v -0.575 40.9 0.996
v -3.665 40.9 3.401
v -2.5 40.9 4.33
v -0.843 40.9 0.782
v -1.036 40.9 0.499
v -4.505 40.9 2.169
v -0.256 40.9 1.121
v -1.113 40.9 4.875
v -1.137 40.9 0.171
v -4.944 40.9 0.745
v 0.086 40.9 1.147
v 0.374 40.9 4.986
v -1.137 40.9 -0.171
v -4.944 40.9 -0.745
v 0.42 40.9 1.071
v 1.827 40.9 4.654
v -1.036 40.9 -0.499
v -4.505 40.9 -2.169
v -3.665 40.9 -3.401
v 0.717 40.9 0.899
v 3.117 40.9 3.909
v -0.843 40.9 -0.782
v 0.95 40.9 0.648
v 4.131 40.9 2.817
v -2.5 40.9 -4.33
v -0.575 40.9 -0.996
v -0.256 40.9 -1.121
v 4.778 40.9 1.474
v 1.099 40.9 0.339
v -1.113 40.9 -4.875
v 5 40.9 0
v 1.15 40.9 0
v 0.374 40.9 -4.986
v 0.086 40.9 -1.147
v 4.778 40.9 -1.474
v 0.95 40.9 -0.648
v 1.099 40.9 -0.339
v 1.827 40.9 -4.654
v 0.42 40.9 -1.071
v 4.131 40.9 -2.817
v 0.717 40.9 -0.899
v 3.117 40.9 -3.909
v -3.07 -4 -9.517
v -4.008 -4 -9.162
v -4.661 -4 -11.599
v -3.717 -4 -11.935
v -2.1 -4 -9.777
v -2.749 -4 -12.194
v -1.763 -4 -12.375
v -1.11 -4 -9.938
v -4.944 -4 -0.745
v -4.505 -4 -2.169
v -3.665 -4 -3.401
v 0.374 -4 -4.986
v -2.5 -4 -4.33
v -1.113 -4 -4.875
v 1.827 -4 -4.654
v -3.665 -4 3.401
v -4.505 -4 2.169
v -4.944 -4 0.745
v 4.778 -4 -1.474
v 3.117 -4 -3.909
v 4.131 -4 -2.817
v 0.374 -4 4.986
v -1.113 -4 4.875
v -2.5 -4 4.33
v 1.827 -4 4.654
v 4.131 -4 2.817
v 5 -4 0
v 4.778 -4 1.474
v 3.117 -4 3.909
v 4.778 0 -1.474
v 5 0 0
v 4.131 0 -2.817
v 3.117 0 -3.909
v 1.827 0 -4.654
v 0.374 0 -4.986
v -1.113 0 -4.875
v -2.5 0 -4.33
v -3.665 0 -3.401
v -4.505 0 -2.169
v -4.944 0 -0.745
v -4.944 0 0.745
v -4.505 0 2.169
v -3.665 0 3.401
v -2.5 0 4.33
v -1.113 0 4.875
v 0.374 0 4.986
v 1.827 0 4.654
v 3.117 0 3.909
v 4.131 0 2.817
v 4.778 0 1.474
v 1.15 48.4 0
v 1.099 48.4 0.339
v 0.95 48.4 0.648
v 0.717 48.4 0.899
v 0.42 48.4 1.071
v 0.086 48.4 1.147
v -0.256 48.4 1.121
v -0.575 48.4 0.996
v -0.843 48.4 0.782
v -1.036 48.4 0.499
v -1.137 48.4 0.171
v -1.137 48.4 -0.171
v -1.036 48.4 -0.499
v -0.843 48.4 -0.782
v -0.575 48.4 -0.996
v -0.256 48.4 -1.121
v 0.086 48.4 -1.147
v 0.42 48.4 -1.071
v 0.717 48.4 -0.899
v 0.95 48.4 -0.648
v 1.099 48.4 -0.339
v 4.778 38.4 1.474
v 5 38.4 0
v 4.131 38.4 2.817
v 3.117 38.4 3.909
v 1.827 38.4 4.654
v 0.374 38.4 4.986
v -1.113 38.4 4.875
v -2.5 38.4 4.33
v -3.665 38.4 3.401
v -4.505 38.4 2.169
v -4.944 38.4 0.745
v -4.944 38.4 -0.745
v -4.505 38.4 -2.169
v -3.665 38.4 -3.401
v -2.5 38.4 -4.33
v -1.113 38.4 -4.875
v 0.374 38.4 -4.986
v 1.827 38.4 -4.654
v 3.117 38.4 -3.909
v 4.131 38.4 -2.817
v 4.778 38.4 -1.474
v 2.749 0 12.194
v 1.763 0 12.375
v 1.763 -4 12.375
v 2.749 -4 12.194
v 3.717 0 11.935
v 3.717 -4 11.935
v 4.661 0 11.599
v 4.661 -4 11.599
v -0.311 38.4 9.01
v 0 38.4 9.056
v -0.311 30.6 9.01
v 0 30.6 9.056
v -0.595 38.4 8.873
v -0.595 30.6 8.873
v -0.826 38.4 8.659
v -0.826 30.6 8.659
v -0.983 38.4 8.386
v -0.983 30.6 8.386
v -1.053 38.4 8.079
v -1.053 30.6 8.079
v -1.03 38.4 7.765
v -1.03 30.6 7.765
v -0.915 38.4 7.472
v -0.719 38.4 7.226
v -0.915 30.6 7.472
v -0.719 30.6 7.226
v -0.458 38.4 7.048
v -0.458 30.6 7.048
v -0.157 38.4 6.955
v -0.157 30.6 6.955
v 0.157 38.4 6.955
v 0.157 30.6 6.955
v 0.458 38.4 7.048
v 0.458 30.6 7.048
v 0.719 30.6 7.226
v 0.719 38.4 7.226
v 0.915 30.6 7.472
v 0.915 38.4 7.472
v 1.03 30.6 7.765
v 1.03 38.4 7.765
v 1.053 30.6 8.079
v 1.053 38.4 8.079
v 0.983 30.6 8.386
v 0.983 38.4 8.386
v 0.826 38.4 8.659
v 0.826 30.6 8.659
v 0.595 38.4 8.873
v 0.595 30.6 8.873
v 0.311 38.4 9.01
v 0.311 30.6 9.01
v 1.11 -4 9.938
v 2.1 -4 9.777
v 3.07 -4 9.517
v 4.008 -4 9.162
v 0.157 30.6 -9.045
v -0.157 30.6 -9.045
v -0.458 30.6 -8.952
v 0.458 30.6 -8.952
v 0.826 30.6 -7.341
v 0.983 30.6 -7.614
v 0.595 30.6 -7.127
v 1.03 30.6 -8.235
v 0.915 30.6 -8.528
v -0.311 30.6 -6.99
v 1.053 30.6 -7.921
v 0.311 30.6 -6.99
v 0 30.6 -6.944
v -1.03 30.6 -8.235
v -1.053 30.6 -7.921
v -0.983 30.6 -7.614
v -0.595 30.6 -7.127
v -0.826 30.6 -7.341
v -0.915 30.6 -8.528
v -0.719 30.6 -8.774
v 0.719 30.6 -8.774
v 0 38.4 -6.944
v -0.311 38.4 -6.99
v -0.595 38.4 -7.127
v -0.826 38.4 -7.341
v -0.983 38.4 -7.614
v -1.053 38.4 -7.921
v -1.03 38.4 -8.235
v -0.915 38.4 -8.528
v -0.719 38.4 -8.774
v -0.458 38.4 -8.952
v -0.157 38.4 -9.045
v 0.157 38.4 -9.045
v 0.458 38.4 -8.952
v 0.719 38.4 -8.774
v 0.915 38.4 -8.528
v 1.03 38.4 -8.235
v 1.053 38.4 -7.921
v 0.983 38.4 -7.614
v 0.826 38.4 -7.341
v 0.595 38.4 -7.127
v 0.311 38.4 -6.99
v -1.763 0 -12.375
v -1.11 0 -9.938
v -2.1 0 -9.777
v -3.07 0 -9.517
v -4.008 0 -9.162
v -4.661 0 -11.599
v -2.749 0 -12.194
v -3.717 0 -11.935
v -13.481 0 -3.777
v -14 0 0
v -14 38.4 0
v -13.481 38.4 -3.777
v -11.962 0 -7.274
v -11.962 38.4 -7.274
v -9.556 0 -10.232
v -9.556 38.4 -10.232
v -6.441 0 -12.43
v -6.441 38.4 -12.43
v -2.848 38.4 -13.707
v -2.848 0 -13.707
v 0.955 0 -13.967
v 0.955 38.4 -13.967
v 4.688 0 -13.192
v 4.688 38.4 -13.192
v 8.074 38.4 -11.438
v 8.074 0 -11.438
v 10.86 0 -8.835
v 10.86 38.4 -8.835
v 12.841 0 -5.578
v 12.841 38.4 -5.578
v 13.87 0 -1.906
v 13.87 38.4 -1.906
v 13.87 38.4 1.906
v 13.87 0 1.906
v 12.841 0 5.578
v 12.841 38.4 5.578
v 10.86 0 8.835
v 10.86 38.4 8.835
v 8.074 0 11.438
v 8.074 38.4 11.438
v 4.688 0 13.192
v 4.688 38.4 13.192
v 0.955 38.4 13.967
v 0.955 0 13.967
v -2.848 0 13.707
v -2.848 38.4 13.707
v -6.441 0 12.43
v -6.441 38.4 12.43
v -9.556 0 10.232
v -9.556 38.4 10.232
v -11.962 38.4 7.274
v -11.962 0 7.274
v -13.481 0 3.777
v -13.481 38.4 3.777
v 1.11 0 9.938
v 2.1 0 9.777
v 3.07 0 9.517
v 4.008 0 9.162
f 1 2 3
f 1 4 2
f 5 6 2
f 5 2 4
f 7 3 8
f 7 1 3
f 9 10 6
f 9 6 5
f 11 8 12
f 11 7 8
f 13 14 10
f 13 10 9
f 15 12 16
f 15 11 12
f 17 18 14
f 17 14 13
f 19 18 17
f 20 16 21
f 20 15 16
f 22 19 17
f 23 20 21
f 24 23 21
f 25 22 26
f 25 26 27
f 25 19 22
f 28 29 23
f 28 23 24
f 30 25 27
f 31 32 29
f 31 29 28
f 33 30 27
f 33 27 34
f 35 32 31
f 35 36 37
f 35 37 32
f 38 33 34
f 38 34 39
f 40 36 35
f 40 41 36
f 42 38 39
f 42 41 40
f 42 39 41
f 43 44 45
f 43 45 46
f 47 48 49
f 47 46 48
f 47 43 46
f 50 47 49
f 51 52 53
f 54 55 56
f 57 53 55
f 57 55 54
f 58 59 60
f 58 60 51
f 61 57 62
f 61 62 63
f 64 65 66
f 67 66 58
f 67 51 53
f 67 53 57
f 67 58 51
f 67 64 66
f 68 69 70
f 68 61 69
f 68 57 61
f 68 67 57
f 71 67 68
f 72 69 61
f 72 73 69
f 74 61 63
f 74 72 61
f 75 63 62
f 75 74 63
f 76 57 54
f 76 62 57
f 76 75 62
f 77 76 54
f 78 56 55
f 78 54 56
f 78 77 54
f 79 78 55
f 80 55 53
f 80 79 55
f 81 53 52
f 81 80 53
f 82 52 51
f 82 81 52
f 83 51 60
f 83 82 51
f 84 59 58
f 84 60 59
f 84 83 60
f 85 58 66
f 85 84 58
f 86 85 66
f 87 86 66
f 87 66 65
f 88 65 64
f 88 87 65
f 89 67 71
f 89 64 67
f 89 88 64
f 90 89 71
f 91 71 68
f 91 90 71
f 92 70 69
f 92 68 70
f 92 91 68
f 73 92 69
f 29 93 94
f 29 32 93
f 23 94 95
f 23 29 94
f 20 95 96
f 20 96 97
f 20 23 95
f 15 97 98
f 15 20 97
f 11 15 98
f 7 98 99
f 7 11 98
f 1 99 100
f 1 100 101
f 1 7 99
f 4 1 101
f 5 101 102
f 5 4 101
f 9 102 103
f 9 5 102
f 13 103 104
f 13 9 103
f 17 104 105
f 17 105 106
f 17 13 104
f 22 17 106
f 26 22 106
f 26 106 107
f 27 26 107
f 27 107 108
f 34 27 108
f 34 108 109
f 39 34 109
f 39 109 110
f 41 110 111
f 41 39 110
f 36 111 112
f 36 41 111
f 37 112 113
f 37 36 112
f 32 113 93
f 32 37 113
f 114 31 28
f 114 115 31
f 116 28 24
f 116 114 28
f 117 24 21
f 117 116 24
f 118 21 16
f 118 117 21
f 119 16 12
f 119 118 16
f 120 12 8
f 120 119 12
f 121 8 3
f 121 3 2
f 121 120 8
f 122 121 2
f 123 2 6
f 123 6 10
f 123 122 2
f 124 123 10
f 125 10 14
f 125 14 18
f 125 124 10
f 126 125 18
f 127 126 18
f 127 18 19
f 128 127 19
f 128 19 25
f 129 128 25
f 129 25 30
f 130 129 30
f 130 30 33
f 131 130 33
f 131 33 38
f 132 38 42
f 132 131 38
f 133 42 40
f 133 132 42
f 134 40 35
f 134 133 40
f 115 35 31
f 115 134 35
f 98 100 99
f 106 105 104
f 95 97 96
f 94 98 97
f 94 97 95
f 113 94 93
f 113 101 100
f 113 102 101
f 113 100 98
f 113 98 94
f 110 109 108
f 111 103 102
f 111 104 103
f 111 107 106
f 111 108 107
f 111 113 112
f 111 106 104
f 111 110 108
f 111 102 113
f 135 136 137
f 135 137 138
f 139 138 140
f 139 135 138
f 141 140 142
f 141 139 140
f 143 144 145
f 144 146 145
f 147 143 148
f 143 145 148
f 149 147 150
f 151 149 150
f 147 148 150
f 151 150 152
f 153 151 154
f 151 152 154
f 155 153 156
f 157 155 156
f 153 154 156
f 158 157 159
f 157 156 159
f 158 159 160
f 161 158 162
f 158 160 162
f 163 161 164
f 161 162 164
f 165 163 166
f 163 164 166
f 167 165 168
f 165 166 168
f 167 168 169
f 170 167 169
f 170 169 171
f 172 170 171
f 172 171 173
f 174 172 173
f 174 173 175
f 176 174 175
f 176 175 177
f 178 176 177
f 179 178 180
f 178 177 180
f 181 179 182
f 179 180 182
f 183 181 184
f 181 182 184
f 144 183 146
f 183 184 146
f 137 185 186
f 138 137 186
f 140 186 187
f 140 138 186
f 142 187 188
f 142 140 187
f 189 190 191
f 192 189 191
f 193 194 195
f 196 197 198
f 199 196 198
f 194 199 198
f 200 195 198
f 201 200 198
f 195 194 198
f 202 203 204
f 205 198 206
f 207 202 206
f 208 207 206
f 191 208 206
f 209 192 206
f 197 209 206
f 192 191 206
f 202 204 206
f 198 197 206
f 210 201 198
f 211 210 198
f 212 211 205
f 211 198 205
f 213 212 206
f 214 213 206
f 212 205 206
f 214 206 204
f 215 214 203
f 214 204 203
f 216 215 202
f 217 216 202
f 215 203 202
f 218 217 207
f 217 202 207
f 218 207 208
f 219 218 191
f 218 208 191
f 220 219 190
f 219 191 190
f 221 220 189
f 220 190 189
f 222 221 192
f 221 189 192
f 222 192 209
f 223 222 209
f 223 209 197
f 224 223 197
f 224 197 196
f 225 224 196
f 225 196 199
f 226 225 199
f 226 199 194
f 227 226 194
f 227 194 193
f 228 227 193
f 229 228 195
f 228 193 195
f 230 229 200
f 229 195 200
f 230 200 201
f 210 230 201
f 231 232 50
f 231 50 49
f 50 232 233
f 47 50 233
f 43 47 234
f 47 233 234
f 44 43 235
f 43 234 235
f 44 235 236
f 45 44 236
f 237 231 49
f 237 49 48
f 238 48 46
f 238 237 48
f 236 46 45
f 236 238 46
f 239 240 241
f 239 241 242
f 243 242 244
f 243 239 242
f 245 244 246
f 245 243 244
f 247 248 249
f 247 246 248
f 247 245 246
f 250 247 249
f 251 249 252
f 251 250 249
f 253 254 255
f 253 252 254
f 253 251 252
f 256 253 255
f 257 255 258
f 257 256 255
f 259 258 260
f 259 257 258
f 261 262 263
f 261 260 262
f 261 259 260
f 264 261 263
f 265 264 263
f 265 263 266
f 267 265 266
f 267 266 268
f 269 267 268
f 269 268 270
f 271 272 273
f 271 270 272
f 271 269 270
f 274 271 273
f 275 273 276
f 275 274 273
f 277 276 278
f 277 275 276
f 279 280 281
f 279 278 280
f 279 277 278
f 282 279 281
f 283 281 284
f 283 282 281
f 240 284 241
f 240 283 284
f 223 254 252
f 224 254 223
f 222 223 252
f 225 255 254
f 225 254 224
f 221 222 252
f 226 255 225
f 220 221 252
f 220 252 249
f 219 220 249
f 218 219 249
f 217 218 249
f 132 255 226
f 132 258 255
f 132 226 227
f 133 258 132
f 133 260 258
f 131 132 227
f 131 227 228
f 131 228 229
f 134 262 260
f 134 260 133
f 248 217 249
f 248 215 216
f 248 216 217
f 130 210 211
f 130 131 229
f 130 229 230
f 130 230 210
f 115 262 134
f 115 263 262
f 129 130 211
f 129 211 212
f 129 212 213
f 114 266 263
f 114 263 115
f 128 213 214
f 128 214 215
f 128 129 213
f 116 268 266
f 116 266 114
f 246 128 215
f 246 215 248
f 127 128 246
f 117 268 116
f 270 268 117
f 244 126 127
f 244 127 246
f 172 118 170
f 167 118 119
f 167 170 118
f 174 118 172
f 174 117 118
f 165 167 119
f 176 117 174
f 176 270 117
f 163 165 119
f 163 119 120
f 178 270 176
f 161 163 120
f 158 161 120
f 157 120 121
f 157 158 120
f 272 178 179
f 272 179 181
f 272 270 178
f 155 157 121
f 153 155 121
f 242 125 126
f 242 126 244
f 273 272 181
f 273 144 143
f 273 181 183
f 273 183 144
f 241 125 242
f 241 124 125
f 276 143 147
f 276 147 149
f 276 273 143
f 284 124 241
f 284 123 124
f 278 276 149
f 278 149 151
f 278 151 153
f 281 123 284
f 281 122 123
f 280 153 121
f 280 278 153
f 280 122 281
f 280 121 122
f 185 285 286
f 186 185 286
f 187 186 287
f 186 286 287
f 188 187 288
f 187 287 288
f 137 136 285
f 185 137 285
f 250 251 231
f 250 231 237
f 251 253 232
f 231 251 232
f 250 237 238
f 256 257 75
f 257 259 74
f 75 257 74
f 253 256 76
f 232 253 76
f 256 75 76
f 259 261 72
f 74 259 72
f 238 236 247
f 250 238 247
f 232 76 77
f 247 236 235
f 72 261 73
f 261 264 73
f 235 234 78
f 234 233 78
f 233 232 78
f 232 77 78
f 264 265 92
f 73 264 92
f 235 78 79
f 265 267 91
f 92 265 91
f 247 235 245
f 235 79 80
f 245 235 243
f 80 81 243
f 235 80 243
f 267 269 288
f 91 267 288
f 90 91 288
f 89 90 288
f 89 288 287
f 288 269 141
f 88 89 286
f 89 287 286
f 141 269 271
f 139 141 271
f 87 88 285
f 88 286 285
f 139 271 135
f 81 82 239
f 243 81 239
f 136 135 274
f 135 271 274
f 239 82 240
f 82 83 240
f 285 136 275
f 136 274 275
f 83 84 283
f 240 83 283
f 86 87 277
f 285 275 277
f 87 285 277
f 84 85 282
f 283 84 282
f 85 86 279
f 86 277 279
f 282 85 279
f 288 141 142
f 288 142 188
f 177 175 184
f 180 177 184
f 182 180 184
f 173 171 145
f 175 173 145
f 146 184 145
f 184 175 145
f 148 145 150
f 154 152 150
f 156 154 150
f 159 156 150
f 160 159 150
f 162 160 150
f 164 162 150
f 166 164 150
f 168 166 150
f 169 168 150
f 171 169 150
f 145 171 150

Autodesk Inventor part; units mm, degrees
ref_plane "YZ Plane" through (0, 0, 0) normal (1, 0, 0) x (0, 1, 0)
ref_plane "XZ Plane" through (0, 0, 0) normal (0, 1, 0) x (-1, 0, 0)
ref_plane "XY Plane" through (0, 0, 0) normal (0, 0, 1) x (1, 0, 0)
sketch "Sketch1" plane through (0, 0, 0) normal (0, 1, 0) x (-1, 0, 0)
  circle A0 centre (0, 0) radius 14
  dimension "d0" = 28
extrude "Extrusion1" add sketch "Sketch1" along normal blind 38.4
sketch "Sketch2" plane through (0, 38.4, 0) normal (0, 1, 0) x (1, 0, 0)
  circle A0 centre (0, 0) radius 5
  circle A1 centre (0, 0) radius 1.15
  circle A2 centre (0, 0) radius 8
  line L0 (0, -8) -> (0, 8)
  dimension "d3" = 10
  dimension "d6" = 2.3
  dimension "d9" = 16
extrude "Extrusion2" add sketch "Sketch2" along normal blind 2.5 contours A0 L0 A1 | L0 A1 A0 | L0 A1 | A1 L0
extrude "Extrusion3" add sketch "Sketch2" along normal blind 10 contours L0 A1 | A1 L0
hole "Hole1" at (0, 38.4, 8) at (0, 38.4, -8) direction (0, -1, 0) diameter 2.1129 depth 7.8 thread size "M2.6x0.45" class "6H" standard "ISO Metric profile"
sketch "Sketch3" plane through (0, 0, 0) normal (0, -1, 0) x (1, 0, 0)
  circle A0 centre (0, 0) radius 5
  dimension "d17" = 10
extrude "Extrusion4" add sketch "Sketch3" along normal blind 4
sketch "Sketch4" plane through (0, 0, 0) normal (0, -1, 0) x (1, 0, 0)
  line L0 (-12.0122, 7.6623) -> (12.8258, 7.6623) construction
  line L1 (12.8258, 7.6623) -> (12.8258, -7.5309) construction
  line L2 (12.8258, -7.5309) -> (-12.0122, -7.5309) construction
  line L3 (-12.0122, -7.5309) -> (-12.0122, 7.6623) construction
  point P0 (0, 0)
sketch "Sketch5" plane through (0, 0, 0) normal (0, -1, 0) x (1, 0, 0)
  circle A0 centre (0, 8) radius 1.0564 projected
  circle A1 centre (0, -8) radius 1.0564 projected
  circle A2 centre (0, 0) radius 5 projected
  circle A3 centre (0, 0) radius 14 projected
  circle A4 centre (0, 0) radius 1.15 projected
  circle A5 centre (0, 0) radius 12.5
  circle A6 centre (0, 0) radius 10
  line L0 (4.6607, 11.5986) -> (4.0078, 9.1617)
  line L1 (1.763, 12.3751) -> (1.11, 9.9382)
  line L2 (-1.11, -9.9382) -> (-1.763, -12.3751)
  line L3 (-4.0078, -9.1617) -> (-4.6607, -11.5986)
  line L4 (3.6235, 13.523) -> (-3.6235, -13.523)
  line L5 (0, 14) -> (0, -14) construction
  circle A7 centre (0, 0) radius 14 projected
  dimension "d21" = 2.5
  dimension "d27" = 20
  dimension "d28" = 1.5
  dimension "d29" = 15
  dimension "d30" = 1.5
  dimension "d31" = 1.5
  dimension "d32" = 1.5
  dimension "d33" = 1.5
extrude "Extrusion5" add sketch "Sketch5" along normal up to surface (4 mm away) contours L4 A5 L0 A6 | A6 L1 A5 L4 | L4 A5 L3 A6 | A6 L2 A5 L4
equation "\"d31\" = d30"
equation "\"d32\" = d30"
properties part number "rs385"
